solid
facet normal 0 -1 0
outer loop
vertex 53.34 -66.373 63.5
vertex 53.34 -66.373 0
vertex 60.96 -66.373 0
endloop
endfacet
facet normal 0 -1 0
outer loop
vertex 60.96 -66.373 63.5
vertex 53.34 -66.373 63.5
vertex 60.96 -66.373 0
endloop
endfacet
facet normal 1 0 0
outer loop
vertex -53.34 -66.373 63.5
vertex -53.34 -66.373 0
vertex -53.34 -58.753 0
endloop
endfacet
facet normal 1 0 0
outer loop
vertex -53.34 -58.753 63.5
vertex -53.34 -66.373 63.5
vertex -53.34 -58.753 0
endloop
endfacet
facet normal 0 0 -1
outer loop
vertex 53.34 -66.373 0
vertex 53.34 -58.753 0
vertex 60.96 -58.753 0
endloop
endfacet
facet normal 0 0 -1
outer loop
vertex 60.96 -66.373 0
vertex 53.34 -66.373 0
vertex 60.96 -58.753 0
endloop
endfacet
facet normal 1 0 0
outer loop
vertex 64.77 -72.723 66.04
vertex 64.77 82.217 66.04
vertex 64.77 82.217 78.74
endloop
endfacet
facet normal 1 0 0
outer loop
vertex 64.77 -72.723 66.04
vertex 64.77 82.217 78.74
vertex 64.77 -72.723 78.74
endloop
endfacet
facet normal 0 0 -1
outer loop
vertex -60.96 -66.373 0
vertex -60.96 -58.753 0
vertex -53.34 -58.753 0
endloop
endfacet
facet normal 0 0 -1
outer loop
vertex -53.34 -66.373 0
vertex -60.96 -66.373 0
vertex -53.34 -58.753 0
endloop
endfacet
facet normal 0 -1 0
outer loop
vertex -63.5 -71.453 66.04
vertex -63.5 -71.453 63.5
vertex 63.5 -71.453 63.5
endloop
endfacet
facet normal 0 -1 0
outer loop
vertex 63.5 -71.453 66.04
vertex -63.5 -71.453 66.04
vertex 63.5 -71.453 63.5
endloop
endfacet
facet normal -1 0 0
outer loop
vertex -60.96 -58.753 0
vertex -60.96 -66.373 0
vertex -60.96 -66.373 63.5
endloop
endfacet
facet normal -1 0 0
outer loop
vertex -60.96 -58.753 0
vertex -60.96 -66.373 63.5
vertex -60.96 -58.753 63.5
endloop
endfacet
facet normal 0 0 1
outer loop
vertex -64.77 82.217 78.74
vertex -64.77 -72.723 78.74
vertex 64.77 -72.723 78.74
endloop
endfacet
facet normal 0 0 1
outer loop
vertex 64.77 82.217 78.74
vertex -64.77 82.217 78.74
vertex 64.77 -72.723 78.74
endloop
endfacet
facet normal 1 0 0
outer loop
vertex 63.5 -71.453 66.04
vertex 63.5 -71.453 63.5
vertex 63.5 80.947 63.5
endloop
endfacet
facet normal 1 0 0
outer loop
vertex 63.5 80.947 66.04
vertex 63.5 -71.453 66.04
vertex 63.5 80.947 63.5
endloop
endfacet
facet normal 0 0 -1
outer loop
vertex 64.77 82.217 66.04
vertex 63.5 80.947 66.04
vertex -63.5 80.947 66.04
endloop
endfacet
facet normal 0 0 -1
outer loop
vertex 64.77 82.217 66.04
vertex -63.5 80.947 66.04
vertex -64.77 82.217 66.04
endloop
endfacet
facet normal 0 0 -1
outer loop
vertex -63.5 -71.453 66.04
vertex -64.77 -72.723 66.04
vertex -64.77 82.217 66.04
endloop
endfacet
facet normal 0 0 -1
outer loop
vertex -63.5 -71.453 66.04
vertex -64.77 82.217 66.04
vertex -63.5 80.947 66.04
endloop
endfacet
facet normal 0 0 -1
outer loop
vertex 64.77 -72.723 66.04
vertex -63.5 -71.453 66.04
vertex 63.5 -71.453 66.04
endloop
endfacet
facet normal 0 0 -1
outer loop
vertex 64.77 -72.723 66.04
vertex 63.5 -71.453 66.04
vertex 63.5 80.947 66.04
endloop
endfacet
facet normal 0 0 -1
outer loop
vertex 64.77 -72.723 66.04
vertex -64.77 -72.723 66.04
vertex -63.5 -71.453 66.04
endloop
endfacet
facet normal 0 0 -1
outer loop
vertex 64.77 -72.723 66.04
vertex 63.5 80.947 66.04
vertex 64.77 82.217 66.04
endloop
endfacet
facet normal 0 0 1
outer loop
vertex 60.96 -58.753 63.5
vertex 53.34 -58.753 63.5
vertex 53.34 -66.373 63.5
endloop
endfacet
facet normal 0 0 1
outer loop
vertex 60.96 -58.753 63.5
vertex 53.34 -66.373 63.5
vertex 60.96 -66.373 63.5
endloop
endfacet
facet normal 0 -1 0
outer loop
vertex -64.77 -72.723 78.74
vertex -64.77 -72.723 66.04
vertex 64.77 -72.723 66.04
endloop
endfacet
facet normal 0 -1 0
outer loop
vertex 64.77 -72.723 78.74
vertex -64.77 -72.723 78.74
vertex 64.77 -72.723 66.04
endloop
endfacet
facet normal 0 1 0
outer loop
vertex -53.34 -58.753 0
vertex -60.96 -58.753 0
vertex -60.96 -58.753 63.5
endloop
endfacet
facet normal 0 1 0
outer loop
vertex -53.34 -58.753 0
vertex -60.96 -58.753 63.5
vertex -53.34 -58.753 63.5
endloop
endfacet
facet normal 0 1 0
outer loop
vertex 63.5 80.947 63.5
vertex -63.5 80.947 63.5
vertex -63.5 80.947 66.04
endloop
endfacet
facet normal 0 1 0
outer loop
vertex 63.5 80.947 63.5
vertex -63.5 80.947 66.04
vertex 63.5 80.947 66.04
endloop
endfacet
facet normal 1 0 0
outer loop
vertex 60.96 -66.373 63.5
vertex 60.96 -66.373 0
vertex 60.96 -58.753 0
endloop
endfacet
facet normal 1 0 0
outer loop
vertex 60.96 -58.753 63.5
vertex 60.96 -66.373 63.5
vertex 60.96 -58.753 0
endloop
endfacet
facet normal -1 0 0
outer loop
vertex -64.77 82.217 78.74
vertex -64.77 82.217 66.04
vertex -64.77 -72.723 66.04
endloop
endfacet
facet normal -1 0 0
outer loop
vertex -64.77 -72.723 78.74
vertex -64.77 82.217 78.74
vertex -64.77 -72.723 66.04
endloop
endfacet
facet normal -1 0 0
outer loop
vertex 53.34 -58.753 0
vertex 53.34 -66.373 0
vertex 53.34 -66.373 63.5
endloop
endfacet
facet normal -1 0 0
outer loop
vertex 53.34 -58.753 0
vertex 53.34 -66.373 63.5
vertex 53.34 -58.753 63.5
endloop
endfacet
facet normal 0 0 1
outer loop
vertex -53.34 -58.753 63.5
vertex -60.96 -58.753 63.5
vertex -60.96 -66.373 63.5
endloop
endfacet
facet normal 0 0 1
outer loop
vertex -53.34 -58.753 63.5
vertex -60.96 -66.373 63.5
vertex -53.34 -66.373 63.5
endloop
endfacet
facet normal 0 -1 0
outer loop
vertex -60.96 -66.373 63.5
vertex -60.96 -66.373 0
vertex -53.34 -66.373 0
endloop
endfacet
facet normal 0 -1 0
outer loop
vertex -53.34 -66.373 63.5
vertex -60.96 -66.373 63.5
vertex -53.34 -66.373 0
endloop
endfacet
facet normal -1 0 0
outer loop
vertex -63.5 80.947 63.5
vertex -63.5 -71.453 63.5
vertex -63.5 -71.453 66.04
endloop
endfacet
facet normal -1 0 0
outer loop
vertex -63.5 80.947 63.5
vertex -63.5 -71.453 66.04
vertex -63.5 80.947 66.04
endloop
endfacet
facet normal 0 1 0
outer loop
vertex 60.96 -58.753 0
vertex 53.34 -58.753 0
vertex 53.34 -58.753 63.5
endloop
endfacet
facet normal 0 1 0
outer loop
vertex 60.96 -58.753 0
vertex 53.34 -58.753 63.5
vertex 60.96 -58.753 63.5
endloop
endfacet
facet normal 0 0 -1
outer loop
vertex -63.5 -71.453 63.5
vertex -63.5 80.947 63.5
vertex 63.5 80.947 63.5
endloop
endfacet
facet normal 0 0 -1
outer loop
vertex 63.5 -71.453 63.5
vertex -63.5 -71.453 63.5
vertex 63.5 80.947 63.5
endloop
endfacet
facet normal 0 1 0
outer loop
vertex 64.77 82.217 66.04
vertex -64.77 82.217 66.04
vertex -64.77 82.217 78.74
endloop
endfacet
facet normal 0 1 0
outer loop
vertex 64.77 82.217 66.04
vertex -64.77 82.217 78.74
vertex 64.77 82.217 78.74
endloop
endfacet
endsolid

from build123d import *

# Parameters (mm, degrees)
F0_W     = 7.62
F0_H     = 7.62
F1_DEPTH = 63.5
F2_W     = 127
F2_H     = 152.4
F2_W_2   = 7.62
F2_H_2   = 7.62
F3_DEPTH = 12.7
F5_START = -2.54
F4_W     = 129.54
F4_H     = 154.94
F4_W_2   = 127
F4_H_2   = 152.4
F5_DEPTH = 12.7


with BuildPart() as f1:
    # F0 (on Top) → F1 (new body)
    with BuildSketch(Plane.XY):
        with Locations((-57.15, -62.5631865114)):
            Rectangle(F0_W, F0_H)
    extrude(amount=F1_DEPTH)


with BuildPart() as f1b:
    # F0 (on Top) → F1, piece 2 (new body)
    with BuildSketch(Plane.XY):
        with Locations((57.15, -62.5631865114)):
            Rectangle(F0_W, F0_H)
    extrude(amount=F1_DEPTH)


with BuildPart() as f3:
    # F2 (on face) → F3 (new body)
    with BuildSketch(Plane.XY.offset(63.5)):
        with Locations((0, 4.7468134886)):
            Rectangle(F2_W, F2_H)
        with Locations((-57.15, -62.5631865114)):
            Rectangle(F2_W_2, F2_H_2, mode=Mode.SUBTRACT)
        with Locations((-57.15, -62.5631865114)):
            Rectangle(F2_W_2, F2_H_2)
    extrude(amount=F3_DEPTH)

    # F4 (on face) → F5 (join)
    with BuildSketch(Plane(origin=(0, 0, 63.5), x_dir=(1, 0, 0), z_dir=(0, 0, -1)).offset(F5_START)):
        with Locations((0, -4.7468134886)):
            Rectangle(F4_W, F4_H)
        with Locations((0, -4.7468134886)):
            Rectangle(F4_W_2, F4_H_2, mode=Mode.SUBTRACT)
        with Locations((0, -4.7468134886)):
            Rectangle(F4_W_2, F4_H_2)
    extrude(amount=-F5_DEPTH)


solid = Compound([f1.part, f1b.part, f3.part])
